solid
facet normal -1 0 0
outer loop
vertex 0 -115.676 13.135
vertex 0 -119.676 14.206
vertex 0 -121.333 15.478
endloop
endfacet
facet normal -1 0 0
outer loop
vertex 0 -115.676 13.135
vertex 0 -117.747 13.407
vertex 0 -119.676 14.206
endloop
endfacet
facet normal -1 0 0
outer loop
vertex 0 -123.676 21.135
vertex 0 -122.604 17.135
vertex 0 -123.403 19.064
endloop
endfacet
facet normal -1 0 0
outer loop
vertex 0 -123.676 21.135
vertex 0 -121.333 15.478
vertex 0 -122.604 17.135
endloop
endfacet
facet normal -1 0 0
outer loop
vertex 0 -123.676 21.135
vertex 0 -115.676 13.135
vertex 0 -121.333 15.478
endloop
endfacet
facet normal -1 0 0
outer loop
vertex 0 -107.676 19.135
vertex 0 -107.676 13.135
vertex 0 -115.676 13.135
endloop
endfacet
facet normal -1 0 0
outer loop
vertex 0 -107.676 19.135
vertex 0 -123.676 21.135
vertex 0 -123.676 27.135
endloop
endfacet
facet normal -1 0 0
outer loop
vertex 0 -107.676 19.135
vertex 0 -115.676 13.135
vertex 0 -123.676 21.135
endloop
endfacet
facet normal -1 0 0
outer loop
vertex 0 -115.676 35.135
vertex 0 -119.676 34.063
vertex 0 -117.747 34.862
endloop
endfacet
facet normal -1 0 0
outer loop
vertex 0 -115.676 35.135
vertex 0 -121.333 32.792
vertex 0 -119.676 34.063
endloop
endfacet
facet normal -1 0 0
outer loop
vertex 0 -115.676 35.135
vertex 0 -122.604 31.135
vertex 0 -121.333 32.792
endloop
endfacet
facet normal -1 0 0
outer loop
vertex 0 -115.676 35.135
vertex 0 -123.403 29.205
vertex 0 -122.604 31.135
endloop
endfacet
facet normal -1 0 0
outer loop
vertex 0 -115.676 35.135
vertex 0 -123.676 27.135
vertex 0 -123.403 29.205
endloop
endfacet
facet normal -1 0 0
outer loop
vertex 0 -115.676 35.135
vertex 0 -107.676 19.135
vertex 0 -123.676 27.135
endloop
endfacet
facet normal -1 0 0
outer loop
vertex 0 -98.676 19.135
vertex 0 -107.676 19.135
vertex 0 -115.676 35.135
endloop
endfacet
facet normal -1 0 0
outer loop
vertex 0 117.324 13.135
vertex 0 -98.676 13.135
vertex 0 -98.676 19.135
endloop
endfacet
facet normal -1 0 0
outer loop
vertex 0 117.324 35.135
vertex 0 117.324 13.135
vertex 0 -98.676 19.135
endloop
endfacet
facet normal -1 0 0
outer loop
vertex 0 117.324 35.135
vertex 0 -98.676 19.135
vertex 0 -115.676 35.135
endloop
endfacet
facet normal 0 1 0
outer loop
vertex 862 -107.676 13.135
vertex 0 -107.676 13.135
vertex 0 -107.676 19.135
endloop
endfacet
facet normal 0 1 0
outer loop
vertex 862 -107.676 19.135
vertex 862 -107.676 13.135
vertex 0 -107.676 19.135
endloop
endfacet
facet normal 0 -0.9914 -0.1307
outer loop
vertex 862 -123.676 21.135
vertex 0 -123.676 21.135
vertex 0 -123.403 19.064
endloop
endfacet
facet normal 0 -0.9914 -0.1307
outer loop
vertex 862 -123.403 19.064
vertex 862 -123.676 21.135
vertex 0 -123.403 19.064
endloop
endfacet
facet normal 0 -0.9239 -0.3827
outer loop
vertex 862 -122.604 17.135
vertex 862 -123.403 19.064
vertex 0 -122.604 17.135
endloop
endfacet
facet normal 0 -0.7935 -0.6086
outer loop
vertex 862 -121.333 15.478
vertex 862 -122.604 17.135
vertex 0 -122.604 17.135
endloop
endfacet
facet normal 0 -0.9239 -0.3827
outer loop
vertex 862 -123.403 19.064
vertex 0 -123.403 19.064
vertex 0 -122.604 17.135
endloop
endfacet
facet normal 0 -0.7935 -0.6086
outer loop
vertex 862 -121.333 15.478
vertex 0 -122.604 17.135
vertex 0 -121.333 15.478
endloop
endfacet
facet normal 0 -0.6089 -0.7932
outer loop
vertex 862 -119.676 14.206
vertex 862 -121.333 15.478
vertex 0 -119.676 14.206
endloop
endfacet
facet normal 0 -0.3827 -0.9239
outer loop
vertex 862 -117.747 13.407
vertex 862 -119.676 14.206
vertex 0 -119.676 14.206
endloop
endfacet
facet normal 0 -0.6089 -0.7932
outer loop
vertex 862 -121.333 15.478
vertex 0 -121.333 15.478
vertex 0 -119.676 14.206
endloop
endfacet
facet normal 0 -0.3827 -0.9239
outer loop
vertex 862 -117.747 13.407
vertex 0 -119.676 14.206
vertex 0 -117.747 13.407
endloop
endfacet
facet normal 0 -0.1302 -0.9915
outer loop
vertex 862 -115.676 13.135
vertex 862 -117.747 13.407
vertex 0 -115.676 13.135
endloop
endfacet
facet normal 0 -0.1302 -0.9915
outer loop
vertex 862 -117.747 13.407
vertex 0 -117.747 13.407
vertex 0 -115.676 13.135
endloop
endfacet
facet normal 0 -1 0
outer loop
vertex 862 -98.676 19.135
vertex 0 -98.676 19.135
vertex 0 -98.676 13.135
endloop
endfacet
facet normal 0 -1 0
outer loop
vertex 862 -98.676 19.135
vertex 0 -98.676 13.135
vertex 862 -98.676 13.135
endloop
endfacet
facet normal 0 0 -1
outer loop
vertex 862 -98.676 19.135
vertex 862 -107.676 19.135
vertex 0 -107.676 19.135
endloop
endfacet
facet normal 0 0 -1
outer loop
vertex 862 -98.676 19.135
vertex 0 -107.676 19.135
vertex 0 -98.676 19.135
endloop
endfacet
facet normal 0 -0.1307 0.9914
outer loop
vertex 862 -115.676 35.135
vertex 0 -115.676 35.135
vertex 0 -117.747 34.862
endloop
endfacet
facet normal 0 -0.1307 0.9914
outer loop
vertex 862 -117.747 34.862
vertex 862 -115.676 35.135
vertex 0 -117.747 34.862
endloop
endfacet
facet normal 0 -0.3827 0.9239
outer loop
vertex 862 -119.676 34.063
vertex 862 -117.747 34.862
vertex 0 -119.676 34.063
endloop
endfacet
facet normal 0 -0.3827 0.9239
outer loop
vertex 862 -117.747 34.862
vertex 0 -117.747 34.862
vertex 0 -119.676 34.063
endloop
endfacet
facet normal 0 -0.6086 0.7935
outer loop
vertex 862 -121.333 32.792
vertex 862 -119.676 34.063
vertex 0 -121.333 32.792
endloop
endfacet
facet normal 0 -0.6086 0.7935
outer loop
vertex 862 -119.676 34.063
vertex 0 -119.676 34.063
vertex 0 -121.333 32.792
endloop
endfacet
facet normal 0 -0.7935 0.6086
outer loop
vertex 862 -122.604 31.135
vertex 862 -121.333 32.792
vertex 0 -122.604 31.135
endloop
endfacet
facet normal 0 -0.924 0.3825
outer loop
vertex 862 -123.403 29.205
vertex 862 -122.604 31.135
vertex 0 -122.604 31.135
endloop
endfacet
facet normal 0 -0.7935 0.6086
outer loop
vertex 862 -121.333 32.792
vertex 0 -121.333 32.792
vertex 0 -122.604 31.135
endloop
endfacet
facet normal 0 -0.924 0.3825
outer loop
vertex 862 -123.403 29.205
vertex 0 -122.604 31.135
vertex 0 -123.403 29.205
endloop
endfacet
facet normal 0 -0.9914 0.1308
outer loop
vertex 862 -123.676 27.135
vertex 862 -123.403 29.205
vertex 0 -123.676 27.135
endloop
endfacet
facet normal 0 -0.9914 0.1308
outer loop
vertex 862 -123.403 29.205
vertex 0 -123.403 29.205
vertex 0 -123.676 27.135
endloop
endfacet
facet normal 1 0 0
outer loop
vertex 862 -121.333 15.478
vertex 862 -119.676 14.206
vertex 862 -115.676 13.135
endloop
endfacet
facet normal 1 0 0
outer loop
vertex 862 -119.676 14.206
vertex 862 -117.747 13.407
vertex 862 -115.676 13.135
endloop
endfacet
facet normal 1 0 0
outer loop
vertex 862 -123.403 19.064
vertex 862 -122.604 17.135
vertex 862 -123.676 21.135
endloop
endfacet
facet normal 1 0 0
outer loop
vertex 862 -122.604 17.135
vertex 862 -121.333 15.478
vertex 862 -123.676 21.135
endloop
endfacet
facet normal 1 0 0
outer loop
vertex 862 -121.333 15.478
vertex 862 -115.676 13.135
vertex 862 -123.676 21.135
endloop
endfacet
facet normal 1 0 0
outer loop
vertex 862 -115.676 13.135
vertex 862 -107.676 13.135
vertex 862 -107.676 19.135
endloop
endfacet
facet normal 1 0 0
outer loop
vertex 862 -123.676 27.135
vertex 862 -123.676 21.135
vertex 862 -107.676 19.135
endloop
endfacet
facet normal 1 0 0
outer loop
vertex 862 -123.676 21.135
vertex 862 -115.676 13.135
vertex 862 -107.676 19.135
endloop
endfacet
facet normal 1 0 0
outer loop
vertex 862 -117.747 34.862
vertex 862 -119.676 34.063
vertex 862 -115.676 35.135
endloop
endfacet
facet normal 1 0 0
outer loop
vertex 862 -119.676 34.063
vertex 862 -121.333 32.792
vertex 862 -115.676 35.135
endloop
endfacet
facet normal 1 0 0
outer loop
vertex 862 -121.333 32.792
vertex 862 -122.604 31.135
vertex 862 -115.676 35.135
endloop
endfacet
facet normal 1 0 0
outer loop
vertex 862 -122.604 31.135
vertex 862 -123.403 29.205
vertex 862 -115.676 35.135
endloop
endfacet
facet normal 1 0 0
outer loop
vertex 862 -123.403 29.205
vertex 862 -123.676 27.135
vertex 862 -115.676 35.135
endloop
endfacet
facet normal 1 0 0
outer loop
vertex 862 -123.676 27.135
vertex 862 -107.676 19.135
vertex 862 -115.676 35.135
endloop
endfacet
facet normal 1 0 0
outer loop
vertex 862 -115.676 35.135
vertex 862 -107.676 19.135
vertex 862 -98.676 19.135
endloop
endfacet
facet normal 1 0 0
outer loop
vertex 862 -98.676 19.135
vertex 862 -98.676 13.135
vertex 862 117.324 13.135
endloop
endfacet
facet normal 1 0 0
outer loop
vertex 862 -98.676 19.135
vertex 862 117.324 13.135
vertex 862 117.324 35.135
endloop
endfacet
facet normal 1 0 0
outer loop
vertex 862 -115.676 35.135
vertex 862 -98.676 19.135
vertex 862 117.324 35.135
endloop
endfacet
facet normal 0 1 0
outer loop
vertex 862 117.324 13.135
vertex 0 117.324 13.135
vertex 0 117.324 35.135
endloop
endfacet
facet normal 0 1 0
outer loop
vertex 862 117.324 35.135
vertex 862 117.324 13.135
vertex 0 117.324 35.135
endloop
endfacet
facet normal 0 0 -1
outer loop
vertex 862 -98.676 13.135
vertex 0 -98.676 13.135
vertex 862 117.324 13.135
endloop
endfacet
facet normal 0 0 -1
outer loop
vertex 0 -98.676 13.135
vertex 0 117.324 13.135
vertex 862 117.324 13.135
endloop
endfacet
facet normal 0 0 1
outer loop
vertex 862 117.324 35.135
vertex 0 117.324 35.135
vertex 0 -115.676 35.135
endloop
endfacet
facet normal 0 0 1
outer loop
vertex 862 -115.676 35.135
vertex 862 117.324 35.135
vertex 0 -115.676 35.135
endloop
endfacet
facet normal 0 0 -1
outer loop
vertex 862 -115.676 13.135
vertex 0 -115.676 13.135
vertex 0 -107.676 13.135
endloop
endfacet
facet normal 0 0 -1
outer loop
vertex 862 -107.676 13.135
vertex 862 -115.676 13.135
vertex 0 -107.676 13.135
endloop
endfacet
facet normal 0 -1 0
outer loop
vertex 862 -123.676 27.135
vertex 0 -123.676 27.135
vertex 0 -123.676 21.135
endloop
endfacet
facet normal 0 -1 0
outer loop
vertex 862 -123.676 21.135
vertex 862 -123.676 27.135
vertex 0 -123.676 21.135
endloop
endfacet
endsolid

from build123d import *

# Parameters (mm, degrees)
F1_DEPTH  = 862
F1_FACE_W = 862
F1_FACE_H = 6
F2_DEPTH  = 1


with BuildPart() as f1:
    # F0 (on Right) → F1 (new body)
    with BuildSketch(Plane.YZ):
        with BuildLine():
            Line((117.323911, 35.13468), (-115.676089, 35.13468))
            ThreePointArc((-115.676089, 35.13468), (-121.332944, 32.791535), (-123.676089, 27.13468))
            Line((-123.676089, 27.13468), (-123.676089, 21.13468))
            ThreePointArc((-123.676089, 21.13468), (-121.332944, 15.477826), (-115.676089, 13.13468))
            Line((-115.676089, 13.13468), (-107.676089, 13.13468))
            Line((-107.676089, 13.13468), (-107.676089, 19.13468))
            Line((-107.676089, 19.13468), (-97.676089, 19.13468))
            Line((-97.676089, 19.13468), (-97.676089, 13.13468))
            Line((-97.676089, 13.13468), (117.323911, 13.13468))
            Line((117.323911, 13.13468), (117.323911, 35.13468))
        make_face()
    extrude(amount=F1_DEPTH)

    # F1_face (on face) → F2 (join)
    with BuildSketch(Plane(origin=(431, -97.676089, 16.13468), x_dir=(1, 0, 0), z_dir=(0, -1, 0))):
        Rectangle(F1_FACE_W, F1_FACE_H)
    extrude(amount=F2_DEPTH)


solid = f1.part
